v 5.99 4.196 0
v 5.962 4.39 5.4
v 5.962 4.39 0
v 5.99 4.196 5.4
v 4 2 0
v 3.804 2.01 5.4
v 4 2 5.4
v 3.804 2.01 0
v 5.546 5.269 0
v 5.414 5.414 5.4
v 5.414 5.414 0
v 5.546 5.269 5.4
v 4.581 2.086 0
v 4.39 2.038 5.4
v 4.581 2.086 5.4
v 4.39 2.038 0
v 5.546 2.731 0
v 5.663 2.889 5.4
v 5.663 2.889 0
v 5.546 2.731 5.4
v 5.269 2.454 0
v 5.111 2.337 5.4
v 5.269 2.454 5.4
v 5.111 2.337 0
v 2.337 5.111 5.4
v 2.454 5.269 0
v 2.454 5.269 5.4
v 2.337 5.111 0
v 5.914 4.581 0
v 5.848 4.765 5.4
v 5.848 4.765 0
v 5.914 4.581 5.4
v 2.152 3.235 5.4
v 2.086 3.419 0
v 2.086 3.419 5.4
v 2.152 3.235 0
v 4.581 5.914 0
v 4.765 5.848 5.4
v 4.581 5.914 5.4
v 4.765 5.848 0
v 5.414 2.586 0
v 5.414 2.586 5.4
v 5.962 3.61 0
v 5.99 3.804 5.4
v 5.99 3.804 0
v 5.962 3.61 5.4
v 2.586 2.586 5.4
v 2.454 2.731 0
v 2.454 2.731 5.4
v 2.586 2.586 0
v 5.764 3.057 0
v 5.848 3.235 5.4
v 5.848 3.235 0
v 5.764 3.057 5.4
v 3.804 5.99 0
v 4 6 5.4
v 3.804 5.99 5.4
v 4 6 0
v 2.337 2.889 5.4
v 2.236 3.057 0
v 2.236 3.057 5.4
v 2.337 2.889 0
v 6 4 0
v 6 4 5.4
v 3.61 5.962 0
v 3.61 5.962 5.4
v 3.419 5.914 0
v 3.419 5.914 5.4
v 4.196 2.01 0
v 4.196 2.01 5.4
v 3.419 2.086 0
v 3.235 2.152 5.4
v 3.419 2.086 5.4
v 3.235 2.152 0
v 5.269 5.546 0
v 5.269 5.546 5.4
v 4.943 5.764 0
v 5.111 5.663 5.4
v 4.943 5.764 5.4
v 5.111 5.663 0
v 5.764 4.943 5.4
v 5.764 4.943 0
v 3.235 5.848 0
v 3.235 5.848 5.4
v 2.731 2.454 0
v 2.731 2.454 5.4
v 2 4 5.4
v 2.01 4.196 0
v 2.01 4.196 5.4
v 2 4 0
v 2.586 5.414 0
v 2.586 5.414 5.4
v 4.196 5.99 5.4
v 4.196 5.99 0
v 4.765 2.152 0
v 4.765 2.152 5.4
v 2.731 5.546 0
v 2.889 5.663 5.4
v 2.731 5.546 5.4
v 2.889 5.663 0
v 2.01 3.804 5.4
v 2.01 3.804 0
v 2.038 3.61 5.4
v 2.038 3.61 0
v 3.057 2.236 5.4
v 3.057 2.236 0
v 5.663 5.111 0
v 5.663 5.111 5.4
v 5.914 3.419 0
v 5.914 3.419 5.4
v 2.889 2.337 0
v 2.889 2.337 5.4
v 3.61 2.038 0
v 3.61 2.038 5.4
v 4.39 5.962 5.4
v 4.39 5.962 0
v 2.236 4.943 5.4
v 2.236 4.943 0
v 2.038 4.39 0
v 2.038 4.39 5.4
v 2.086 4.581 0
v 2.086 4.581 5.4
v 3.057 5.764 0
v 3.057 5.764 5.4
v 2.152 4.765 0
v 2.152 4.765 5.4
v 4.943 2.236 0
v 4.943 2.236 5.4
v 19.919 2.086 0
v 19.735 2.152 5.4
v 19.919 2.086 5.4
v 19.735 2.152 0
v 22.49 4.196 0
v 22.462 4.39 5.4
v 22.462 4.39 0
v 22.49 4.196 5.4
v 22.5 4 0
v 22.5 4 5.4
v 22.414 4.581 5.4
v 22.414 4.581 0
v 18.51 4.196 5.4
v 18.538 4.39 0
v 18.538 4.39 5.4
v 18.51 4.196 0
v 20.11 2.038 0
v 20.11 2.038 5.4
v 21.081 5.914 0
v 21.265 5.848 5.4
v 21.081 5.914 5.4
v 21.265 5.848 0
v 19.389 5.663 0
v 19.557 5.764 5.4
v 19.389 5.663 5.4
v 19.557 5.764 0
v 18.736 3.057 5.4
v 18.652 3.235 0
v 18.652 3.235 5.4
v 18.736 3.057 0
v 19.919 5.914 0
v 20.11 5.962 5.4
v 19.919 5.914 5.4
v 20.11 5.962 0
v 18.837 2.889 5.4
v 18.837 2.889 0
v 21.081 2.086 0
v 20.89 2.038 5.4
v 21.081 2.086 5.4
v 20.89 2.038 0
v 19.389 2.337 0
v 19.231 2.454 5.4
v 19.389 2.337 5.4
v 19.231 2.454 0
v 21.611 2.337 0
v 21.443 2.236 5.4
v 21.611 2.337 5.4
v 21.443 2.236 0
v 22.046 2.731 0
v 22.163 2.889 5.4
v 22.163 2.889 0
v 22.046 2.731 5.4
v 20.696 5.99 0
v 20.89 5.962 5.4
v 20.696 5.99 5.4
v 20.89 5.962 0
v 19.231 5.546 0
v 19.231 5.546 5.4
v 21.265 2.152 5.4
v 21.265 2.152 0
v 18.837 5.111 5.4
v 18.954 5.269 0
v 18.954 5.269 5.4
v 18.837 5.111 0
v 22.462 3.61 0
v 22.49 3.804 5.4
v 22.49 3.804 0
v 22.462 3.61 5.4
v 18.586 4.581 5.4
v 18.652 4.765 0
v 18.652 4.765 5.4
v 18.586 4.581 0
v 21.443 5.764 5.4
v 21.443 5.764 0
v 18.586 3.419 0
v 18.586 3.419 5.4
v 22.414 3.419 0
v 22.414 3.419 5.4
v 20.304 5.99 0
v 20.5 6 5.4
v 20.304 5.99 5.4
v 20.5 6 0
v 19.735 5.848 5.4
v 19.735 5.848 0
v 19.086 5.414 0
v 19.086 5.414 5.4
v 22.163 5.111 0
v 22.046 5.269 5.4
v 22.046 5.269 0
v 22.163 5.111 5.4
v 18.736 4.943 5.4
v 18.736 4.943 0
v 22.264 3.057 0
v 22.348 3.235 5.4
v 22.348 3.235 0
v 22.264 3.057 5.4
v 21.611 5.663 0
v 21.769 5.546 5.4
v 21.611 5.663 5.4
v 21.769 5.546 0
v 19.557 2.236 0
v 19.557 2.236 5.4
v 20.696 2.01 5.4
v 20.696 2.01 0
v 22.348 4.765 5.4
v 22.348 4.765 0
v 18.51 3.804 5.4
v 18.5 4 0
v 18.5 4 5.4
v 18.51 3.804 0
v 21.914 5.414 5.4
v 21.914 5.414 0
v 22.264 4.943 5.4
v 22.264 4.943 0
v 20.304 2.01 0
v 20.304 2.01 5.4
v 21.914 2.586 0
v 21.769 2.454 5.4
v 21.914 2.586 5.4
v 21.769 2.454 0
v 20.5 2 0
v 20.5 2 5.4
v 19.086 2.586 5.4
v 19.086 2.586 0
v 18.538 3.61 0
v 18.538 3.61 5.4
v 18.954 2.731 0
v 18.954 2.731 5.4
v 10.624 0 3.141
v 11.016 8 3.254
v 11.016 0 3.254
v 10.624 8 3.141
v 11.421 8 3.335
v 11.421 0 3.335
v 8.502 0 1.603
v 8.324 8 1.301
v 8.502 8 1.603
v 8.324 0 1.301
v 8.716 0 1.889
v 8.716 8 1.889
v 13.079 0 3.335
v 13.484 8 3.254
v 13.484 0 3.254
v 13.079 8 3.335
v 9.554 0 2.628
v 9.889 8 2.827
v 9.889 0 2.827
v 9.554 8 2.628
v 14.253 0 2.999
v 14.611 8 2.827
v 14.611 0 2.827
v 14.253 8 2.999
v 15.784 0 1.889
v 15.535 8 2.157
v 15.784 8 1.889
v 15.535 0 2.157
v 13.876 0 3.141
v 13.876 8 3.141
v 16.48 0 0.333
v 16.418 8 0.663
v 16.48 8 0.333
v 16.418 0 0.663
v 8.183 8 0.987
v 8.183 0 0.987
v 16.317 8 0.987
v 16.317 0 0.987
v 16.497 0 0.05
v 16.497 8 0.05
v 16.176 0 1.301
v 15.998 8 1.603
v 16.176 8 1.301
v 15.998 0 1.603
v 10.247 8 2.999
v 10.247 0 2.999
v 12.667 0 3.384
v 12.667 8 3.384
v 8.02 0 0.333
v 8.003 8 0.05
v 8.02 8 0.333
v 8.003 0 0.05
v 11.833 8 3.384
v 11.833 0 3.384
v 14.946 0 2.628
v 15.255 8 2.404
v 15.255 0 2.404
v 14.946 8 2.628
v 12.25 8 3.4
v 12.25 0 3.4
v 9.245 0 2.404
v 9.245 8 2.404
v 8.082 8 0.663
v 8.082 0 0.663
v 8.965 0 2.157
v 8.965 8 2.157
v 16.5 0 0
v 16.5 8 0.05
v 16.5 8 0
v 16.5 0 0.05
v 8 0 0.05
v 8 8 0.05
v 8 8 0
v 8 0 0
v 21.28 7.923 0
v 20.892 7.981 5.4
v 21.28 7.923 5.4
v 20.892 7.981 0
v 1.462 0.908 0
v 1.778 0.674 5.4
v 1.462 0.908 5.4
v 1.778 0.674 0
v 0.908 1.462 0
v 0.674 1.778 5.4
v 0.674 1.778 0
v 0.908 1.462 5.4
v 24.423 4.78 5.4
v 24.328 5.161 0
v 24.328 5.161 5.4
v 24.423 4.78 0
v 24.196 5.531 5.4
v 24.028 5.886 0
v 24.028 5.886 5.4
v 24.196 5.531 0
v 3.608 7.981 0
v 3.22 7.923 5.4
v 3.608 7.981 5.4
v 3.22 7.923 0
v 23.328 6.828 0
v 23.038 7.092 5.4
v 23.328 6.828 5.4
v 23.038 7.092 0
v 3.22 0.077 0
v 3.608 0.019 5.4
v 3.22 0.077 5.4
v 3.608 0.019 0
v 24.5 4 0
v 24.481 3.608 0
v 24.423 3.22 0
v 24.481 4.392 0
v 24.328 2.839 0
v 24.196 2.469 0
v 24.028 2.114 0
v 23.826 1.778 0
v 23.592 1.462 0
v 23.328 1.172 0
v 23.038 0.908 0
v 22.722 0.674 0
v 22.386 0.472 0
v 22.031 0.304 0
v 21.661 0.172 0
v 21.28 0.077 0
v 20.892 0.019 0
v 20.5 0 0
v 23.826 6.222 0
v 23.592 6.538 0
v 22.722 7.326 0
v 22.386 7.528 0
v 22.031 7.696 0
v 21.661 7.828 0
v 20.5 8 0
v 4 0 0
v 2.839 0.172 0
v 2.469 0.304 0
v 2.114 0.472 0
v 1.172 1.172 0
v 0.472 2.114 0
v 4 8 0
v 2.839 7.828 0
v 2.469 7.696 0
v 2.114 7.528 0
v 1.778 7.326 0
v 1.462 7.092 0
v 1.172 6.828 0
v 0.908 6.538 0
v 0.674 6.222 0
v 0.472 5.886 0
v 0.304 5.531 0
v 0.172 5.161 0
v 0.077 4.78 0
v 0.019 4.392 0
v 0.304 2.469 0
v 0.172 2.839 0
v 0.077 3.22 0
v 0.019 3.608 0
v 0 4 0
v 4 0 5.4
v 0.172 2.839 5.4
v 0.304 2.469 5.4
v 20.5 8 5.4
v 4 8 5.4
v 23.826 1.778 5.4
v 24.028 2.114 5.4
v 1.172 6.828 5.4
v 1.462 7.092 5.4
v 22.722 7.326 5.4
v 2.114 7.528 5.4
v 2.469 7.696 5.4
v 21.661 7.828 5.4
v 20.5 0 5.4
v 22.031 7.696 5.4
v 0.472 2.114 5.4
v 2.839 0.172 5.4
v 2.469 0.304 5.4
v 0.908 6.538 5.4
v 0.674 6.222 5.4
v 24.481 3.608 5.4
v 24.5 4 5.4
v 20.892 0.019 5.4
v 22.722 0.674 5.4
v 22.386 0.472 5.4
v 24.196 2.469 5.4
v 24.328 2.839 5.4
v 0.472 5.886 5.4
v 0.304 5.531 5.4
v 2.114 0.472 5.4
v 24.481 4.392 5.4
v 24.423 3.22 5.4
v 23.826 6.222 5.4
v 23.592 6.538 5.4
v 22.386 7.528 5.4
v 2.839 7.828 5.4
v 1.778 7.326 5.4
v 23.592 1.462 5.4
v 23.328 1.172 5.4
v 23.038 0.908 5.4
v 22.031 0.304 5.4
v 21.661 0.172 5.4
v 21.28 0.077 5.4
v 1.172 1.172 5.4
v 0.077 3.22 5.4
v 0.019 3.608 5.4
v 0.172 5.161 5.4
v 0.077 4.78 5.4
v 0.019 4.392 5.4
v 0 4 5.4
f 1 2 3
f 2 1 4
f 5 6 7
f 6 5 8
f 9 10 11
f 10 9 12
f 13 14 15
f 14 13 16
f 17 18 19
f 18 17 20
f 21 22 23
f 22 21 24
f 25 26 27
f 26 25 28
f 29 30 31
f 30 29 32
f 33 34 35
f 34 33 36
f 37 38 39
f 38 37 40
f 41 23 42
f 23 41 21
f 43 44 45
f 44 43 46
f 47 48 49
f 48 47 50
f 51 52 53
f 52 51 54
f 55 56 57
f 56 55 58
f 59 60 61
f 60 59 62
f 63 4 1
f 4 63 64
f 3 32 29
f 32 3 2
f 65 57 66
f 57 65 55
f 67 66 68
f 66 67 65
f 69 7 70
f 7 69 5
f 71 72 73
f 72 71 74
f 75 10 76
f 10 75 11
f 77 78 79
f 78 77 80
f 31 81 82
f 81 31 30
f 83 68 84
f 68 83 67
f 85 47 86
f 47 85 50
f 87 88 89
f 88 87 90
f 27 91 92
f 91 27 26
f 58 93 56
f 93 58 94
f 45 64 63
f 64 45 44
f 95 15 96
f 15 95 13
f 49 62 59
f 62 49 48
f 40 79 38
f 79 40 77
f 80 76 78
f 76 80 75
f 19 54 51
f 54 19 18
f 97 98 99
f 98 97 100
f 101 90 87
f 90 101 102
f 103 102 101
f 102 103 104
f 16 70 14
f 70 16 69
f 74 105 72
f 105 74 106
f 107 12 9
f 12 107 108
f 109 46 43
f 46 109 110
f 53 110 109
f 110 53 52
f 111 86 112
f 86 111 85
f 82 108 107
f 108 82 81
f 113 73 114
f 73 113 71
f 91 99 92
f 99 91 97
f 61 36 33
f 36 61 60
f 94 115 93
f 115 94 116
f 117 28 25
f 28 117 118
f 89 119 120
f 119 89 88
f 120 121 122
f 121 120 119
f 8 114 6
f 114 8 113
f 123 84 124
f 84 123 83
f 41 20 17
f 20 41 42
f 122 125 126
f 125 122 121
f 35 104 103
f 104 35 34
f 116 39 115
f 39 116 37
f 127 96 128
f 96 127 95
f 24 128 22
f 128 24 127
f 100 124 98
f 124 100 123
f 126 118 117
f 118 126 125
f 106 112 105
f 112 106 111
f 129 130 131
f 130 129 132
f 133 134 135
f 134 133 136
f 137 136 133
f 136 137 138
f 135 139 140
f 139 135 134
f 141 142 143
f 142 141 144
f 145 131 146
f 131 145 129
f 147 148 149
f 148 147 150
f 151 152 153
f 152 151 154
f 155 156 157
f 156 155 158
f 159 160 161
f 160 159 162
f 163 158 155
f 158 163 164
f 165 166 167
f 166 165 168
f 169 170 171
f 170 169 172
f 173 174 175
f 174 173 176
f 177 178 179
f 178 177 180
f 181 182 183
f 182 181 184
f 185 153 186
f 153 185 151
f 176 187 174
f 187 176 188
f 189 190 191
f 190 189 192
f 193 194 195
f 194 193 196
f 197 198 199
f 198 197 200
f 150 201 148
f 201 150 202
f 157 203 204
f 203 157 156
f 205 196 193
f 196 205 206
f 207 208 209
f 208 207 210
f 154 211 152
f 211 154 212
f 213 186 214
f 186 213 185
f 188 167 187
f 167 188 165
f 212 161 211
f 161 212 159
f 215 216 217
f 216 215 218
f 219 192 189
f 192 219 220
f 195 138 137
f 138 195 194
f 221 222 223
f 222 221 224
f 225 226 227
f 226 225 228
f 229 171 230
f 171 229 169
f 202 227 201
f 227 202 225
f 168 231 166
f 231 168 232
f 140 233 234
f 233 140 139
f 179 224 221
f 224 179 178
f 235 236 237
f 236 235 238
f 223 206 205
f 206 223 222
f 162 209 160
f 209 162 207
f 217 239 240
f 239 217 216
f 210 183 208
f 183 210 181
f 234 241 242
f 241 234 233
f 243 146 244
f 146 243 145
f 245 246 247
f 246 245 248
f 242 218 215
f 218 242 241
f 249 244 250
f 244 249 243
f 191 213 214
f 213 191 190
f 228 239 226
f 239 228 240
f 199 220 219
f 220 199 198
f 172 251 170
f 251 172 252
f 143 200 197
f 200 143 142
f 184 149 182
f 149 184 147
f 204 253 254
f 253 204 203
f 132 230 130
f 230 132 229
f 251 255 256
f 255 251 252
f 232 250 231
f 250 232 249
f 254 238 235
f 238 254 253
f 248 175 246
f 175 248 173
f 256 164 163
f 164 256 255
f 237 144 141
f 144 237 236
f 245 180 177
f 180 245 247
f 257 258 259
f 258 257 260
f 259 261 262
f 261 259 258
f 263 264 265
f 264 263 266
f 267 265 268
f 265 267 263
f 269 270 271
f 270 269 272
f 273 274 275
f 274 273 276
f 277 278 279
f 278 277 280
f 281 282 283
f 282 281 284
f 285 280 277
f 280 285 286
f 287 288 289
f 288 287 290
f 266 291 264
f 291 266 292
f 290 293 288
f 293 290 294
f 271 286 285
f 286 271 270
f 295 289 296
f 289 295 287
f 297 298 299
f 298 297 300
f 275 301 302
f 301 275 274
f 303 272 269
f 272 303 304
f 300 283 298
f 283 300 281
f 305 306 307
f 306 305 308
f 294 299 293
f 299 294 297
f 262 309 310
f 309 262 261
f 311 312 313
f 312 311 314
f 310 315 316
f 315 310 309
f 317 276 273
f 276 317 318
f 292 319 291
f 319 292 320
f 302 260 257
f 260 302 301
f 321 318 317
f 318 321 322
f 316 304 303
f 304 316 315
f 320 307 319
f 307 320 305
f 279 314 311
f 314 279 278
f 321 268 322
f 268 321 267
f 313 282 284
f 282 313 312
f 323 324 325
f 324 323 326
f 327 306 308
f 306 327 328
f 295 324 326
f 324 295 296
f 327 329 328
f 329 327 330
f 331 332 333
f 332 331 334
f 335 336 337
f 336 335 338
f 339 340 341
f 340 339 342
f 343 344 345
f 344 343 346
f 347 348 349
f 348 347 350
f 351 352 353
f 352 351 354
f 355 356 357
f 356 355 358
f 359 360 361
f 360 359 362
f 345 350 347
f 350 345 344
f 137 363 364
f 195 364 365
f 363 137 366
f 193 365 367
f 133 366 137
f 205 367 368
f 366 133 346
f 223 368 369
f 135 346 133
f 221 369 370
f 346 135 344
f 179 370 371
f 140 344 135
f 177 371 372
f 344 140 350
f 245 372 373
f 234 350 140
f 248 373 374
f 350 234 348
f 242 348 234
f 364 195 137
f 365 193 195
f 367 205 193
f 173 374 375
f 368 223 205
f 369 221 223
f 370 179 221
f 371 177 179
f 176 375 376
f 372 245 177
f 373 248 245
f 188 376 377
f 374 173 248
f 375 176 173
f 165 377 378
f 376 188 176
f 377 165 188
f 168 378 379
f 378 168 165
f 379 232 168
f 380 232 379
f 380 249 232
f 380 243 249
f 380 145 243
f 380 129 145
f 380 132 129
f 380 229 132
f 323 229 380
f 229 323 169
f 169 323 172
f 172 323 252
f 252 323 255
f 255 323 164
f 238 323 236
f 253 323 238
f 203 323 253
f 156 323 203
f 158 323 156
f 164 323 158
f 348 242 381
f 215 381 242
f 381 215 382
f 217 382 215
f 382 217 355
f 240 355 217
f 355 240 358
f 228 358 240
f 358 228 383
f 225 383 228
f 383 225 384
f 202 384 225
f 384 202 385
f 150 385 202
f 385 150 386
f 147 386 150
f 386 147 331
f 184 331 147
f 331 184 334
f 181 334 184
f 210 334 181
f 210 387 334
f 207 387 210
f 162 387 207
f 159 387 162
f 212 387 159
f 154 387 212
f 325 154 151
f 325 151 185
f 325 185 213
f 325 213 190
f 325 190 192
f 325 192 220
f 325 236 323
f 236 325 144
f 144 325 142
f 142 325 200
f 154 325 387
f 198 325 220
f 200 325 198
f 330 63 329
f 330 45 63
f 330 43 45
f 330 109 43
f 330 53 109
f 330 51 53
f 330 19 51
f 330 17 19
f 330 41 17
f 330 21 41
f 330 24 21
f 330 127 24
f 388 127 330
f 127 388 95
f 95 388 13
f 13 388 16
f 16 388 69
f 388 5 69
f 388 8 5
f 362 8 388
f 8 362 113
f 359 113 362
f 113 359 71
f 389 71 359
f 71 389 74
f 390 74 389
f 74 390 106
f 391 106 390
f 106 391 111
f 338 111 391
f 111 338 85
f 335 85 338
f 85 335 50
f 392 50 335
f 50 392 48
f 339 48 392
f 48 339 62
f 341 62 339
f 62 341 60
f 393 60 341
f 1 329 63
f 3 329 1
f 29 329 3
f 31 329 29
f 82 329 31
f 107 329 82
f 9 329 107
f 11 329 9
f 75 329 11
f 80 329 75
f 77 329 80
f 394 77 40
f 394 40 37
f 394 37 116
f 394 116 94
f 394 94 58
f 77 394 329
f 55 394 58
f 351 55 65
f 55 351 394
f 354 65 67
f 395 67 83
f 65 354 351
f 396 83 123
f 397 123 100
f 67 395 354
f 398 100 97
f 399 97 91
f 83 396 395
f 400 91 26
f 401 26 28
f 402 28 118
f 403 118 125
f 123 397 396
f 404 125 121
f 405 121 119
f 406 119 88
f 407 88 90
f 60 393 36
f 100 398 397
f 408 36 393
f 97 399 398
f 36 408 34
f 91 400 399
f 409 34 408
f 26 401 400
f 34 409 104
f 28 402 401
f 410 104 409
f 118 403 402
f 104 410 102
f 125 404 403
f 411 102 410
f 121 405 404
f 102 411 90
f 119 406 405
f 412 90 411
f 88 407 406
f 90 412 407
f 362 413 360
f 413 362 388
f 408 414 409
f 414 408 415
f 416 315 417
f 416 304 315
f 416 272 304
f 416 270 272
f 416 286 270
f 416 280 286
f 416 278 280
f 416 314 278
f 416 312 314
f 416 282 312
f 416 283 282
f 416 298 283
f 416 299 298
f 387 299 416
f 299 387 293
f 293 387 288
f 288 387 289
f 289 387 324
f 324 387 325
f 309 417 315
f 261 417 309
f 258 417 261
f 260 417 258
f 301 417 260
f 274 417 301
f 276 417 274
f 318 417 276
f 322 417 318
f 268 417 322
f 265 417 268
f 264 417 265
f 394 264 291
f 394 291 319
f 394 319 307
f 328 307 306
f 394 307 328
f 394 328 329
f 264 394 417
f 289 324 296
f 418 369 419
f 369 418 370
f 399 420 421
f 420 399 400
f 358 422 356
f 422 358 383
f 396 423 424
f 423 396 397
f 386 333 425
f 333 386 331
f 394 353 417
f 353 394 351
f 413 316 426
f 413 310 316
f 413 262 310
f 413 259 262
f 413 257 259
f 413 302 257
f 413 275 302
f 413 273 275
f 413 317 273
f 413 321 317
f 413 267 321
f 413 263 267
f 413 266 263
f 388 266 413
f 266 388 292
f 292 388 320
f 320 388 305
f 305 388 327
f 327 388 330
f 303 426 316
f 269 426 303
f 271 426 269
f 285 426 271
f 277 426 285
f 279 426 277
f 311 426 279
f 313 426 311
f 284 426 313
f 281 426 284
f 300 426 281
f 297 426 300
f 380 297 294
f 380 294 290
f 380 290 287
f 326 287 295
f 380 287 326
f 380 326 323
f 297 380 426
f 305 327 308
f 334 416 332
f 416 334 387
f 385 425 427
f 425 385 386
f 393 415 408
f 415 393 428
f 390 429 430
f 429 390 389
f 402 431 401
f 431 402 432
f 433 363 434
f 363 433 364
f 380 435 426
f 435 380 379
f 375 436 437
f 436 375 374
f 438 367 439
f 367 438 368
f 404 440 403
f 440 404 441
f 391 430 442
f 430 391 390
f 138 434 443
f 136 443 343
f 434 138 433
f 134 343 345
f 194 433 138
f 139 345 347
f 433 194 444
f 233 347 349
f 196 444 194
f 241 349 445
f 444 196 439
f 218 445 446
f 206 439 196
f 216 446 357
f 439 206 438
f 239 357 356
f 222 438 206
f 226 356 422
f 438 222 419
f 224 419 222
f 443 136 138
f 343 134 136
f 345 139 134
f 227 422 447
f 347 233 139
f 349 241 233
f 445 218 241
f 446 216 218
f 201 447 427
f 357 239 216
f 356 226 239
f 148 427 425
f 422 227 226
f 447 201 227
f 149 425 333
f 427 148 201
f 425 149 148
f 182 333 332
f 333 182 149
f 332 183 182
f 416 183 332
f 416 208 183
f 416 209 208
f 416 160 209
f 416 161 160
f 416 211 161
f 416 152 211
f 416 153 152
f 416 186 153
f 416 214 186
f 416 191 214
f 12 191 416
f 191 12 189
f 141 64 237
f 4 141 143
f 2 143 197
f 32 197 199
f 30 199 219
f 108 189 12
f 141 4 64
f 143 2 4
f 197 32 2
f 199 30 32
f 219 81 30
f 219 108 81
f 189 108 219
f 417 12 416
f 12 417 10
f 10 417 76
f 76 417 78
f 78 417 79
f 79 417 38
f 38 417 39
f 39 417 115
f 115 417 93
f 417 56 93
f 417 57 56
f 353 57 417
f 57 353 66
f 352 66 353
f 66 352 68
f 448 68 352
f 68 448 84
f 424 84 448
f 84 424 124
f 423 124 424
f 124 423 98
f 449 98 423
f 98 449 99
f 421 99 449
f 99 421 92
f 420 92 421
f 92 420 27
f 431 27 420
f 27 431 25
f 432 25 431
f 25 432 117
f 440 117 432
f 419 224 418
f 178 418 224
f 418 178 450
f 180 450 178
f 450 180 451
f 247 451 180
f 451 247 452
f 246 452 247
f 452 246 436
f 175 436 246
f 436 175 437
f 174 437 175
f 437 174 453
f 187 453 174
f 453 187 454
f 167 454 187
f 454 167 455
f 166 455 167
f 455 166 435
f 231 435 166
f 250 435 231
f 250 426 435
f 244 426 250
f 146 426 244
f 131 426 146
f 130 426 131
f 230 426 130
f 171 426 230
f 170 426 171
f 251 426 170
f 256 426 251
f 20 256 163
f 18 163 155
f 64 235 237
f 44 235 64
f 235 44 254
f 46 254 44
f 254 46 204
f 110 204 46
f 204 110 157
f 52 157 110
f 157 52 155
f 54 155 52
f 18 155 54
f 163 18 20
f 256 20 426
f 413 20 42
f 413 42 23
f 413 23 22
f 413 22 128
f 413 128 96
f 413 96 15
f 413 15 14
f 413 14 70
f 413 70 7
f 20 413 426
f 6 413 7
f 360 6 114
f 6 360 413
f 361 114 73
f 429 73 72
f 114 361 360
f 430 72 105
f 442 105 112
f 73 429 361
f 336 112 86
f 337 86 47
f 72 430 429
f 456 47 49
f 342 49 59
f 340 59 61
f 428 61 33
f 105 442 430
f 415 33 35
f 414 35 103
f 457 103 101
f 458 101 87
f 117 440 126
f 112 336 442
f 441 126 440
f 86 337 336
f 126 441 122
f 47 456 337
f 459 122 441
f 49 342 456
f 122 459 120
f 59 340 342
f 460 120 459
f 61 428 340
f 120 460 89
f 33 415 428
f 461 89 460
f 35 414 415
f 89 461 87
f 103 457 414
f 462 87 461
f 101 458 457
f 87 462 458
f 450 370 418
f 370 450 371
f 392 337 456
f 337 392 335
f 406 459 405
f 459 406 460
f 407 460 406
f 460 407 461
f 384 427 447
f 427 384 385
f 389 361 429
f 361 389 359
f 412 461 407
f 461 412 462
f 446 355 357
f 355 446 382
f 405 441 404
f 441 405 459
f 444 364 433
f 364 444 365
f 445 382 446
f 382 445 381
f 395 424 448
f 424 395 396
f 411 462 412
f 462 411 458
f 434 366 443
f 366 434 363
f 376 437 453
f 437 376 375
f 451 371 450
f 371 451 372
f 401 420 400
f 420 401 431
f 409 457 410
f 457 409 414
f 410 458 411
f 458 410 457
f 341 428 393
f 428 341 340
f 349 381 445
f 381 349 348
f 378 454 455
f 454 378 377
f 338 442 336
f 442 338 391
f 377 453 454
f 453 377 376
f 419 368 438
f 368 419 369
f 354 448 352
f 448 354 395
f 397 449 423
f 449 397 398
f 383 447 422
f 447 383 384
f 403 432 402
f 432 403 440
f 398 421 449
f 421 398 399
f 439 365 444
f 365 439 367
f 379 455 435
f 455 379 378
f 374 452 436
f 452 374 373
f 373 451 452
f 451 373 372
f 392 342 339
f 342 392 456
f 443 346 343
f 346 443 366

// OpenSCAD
/* [Basics] */
// - Size in diameter.
ScrewHole       = 4;
// - The width of the hole. To change the height, change Advanced->CableHoleRatio
CableHole       = 8.5;
// - Rotate the model for easyer print
RotateModel   = 0; // [1:Yes,0:No]

/* [Advanced] */
// - The amount of roof above the cable hole.
RoofHeight      = 2;
// - The amount of extra feet-height.
ExtraFeetHeight = 0;
// - Adds extra depth.
AddDepth        = 0;
// - The size of the walls around the screw holes.
WallThickness   = 2;
// - Change the roundness of the cable hole
CableHoleRatio  = 1.25;
// - Change the height of the hole. If 0 the model will be calculated through the Cable Hole Ratio
CableHoleHeight = 0;


/* Variables */
tCableHoleHeight = CableHoleHeight > 0 ? CableHoleHeight : CableHole / CableHoleRatio;
echo(tCableHoleHeight);
tWidth  = CableHole + ScrewHole*2 + WallThickness*4; //X
tDepth  = ScrewHole + WallThickness * 2; //Y
tHeight = tCableHoleHeight/2 + RoofHeight + ExtraFeetHeight; //Z
tCornerRadio = tDepth/2;

difference() {
   roundedCube(tWidth, tDepth, tHeight, tCornerRadio);
   if (RotateModel) {
        translate([0,tDepth,tHeight])
        rotate([180, 0, 0])
        cutouts();
   } else {
       cutouts();
   }
}


module roundedCube(){
    $fn=64;

    hull(){
        //LB Ring
        translate([tCornerRadio,tCornerRadio, 0])
            cylinder(r=tCornerRadio, h=tHeight);
        //RB Ring
        translate([tWidth-tCornerRadio,tCornerRadio, 0])
            cylinder(r=tCornerRadio, h=tHeight);
        //LT Ring
        translate([tCornerRadio, tDepth-tCornerRadio + AddDepth, 0])
            cylinder(r=tCornerRadio, h=tHeight);
        //RT Ring
        translate([tWidth-tCornerRadio, tDepth-tCornerRadio + AddDepth, 0])
            cylinder(r=tCornerRadio, h=tHeight);
    }
}

module cutouts() {
    $fn=64;
    pad = 0.1; // Padding to maintain manifold

    translate([ScrewHole/2+WallThickness, ScrewHole/2+WallThickness+AddDepth/2, -pad/2])
    cylinder(h=tHeight+pad, r=ScrewHole/2);
    
    translate([tWidth-ScrewHole/2-WallThickness, ScrewHole/2+WallThickness+AddDepth/2, -pad/2])
    cylinder(h=tHeight+pad, r=ScrewHole/2);
    
    rotate([-90, 0, 0])
    translate([ScrewHole+WallThickness*2+CableHole/2, -ExtraFeetHeight, -pad/2])
    resize([CableHole,tCableHoleHeight, tDepth+pad])
    cylinder(1);
    translate([ScrewHole+WallThickness*2, -pad/2, -pad/2])
    cube([CableHole,tDepth+pad,ExtraFeetHeight+pad]);
}
